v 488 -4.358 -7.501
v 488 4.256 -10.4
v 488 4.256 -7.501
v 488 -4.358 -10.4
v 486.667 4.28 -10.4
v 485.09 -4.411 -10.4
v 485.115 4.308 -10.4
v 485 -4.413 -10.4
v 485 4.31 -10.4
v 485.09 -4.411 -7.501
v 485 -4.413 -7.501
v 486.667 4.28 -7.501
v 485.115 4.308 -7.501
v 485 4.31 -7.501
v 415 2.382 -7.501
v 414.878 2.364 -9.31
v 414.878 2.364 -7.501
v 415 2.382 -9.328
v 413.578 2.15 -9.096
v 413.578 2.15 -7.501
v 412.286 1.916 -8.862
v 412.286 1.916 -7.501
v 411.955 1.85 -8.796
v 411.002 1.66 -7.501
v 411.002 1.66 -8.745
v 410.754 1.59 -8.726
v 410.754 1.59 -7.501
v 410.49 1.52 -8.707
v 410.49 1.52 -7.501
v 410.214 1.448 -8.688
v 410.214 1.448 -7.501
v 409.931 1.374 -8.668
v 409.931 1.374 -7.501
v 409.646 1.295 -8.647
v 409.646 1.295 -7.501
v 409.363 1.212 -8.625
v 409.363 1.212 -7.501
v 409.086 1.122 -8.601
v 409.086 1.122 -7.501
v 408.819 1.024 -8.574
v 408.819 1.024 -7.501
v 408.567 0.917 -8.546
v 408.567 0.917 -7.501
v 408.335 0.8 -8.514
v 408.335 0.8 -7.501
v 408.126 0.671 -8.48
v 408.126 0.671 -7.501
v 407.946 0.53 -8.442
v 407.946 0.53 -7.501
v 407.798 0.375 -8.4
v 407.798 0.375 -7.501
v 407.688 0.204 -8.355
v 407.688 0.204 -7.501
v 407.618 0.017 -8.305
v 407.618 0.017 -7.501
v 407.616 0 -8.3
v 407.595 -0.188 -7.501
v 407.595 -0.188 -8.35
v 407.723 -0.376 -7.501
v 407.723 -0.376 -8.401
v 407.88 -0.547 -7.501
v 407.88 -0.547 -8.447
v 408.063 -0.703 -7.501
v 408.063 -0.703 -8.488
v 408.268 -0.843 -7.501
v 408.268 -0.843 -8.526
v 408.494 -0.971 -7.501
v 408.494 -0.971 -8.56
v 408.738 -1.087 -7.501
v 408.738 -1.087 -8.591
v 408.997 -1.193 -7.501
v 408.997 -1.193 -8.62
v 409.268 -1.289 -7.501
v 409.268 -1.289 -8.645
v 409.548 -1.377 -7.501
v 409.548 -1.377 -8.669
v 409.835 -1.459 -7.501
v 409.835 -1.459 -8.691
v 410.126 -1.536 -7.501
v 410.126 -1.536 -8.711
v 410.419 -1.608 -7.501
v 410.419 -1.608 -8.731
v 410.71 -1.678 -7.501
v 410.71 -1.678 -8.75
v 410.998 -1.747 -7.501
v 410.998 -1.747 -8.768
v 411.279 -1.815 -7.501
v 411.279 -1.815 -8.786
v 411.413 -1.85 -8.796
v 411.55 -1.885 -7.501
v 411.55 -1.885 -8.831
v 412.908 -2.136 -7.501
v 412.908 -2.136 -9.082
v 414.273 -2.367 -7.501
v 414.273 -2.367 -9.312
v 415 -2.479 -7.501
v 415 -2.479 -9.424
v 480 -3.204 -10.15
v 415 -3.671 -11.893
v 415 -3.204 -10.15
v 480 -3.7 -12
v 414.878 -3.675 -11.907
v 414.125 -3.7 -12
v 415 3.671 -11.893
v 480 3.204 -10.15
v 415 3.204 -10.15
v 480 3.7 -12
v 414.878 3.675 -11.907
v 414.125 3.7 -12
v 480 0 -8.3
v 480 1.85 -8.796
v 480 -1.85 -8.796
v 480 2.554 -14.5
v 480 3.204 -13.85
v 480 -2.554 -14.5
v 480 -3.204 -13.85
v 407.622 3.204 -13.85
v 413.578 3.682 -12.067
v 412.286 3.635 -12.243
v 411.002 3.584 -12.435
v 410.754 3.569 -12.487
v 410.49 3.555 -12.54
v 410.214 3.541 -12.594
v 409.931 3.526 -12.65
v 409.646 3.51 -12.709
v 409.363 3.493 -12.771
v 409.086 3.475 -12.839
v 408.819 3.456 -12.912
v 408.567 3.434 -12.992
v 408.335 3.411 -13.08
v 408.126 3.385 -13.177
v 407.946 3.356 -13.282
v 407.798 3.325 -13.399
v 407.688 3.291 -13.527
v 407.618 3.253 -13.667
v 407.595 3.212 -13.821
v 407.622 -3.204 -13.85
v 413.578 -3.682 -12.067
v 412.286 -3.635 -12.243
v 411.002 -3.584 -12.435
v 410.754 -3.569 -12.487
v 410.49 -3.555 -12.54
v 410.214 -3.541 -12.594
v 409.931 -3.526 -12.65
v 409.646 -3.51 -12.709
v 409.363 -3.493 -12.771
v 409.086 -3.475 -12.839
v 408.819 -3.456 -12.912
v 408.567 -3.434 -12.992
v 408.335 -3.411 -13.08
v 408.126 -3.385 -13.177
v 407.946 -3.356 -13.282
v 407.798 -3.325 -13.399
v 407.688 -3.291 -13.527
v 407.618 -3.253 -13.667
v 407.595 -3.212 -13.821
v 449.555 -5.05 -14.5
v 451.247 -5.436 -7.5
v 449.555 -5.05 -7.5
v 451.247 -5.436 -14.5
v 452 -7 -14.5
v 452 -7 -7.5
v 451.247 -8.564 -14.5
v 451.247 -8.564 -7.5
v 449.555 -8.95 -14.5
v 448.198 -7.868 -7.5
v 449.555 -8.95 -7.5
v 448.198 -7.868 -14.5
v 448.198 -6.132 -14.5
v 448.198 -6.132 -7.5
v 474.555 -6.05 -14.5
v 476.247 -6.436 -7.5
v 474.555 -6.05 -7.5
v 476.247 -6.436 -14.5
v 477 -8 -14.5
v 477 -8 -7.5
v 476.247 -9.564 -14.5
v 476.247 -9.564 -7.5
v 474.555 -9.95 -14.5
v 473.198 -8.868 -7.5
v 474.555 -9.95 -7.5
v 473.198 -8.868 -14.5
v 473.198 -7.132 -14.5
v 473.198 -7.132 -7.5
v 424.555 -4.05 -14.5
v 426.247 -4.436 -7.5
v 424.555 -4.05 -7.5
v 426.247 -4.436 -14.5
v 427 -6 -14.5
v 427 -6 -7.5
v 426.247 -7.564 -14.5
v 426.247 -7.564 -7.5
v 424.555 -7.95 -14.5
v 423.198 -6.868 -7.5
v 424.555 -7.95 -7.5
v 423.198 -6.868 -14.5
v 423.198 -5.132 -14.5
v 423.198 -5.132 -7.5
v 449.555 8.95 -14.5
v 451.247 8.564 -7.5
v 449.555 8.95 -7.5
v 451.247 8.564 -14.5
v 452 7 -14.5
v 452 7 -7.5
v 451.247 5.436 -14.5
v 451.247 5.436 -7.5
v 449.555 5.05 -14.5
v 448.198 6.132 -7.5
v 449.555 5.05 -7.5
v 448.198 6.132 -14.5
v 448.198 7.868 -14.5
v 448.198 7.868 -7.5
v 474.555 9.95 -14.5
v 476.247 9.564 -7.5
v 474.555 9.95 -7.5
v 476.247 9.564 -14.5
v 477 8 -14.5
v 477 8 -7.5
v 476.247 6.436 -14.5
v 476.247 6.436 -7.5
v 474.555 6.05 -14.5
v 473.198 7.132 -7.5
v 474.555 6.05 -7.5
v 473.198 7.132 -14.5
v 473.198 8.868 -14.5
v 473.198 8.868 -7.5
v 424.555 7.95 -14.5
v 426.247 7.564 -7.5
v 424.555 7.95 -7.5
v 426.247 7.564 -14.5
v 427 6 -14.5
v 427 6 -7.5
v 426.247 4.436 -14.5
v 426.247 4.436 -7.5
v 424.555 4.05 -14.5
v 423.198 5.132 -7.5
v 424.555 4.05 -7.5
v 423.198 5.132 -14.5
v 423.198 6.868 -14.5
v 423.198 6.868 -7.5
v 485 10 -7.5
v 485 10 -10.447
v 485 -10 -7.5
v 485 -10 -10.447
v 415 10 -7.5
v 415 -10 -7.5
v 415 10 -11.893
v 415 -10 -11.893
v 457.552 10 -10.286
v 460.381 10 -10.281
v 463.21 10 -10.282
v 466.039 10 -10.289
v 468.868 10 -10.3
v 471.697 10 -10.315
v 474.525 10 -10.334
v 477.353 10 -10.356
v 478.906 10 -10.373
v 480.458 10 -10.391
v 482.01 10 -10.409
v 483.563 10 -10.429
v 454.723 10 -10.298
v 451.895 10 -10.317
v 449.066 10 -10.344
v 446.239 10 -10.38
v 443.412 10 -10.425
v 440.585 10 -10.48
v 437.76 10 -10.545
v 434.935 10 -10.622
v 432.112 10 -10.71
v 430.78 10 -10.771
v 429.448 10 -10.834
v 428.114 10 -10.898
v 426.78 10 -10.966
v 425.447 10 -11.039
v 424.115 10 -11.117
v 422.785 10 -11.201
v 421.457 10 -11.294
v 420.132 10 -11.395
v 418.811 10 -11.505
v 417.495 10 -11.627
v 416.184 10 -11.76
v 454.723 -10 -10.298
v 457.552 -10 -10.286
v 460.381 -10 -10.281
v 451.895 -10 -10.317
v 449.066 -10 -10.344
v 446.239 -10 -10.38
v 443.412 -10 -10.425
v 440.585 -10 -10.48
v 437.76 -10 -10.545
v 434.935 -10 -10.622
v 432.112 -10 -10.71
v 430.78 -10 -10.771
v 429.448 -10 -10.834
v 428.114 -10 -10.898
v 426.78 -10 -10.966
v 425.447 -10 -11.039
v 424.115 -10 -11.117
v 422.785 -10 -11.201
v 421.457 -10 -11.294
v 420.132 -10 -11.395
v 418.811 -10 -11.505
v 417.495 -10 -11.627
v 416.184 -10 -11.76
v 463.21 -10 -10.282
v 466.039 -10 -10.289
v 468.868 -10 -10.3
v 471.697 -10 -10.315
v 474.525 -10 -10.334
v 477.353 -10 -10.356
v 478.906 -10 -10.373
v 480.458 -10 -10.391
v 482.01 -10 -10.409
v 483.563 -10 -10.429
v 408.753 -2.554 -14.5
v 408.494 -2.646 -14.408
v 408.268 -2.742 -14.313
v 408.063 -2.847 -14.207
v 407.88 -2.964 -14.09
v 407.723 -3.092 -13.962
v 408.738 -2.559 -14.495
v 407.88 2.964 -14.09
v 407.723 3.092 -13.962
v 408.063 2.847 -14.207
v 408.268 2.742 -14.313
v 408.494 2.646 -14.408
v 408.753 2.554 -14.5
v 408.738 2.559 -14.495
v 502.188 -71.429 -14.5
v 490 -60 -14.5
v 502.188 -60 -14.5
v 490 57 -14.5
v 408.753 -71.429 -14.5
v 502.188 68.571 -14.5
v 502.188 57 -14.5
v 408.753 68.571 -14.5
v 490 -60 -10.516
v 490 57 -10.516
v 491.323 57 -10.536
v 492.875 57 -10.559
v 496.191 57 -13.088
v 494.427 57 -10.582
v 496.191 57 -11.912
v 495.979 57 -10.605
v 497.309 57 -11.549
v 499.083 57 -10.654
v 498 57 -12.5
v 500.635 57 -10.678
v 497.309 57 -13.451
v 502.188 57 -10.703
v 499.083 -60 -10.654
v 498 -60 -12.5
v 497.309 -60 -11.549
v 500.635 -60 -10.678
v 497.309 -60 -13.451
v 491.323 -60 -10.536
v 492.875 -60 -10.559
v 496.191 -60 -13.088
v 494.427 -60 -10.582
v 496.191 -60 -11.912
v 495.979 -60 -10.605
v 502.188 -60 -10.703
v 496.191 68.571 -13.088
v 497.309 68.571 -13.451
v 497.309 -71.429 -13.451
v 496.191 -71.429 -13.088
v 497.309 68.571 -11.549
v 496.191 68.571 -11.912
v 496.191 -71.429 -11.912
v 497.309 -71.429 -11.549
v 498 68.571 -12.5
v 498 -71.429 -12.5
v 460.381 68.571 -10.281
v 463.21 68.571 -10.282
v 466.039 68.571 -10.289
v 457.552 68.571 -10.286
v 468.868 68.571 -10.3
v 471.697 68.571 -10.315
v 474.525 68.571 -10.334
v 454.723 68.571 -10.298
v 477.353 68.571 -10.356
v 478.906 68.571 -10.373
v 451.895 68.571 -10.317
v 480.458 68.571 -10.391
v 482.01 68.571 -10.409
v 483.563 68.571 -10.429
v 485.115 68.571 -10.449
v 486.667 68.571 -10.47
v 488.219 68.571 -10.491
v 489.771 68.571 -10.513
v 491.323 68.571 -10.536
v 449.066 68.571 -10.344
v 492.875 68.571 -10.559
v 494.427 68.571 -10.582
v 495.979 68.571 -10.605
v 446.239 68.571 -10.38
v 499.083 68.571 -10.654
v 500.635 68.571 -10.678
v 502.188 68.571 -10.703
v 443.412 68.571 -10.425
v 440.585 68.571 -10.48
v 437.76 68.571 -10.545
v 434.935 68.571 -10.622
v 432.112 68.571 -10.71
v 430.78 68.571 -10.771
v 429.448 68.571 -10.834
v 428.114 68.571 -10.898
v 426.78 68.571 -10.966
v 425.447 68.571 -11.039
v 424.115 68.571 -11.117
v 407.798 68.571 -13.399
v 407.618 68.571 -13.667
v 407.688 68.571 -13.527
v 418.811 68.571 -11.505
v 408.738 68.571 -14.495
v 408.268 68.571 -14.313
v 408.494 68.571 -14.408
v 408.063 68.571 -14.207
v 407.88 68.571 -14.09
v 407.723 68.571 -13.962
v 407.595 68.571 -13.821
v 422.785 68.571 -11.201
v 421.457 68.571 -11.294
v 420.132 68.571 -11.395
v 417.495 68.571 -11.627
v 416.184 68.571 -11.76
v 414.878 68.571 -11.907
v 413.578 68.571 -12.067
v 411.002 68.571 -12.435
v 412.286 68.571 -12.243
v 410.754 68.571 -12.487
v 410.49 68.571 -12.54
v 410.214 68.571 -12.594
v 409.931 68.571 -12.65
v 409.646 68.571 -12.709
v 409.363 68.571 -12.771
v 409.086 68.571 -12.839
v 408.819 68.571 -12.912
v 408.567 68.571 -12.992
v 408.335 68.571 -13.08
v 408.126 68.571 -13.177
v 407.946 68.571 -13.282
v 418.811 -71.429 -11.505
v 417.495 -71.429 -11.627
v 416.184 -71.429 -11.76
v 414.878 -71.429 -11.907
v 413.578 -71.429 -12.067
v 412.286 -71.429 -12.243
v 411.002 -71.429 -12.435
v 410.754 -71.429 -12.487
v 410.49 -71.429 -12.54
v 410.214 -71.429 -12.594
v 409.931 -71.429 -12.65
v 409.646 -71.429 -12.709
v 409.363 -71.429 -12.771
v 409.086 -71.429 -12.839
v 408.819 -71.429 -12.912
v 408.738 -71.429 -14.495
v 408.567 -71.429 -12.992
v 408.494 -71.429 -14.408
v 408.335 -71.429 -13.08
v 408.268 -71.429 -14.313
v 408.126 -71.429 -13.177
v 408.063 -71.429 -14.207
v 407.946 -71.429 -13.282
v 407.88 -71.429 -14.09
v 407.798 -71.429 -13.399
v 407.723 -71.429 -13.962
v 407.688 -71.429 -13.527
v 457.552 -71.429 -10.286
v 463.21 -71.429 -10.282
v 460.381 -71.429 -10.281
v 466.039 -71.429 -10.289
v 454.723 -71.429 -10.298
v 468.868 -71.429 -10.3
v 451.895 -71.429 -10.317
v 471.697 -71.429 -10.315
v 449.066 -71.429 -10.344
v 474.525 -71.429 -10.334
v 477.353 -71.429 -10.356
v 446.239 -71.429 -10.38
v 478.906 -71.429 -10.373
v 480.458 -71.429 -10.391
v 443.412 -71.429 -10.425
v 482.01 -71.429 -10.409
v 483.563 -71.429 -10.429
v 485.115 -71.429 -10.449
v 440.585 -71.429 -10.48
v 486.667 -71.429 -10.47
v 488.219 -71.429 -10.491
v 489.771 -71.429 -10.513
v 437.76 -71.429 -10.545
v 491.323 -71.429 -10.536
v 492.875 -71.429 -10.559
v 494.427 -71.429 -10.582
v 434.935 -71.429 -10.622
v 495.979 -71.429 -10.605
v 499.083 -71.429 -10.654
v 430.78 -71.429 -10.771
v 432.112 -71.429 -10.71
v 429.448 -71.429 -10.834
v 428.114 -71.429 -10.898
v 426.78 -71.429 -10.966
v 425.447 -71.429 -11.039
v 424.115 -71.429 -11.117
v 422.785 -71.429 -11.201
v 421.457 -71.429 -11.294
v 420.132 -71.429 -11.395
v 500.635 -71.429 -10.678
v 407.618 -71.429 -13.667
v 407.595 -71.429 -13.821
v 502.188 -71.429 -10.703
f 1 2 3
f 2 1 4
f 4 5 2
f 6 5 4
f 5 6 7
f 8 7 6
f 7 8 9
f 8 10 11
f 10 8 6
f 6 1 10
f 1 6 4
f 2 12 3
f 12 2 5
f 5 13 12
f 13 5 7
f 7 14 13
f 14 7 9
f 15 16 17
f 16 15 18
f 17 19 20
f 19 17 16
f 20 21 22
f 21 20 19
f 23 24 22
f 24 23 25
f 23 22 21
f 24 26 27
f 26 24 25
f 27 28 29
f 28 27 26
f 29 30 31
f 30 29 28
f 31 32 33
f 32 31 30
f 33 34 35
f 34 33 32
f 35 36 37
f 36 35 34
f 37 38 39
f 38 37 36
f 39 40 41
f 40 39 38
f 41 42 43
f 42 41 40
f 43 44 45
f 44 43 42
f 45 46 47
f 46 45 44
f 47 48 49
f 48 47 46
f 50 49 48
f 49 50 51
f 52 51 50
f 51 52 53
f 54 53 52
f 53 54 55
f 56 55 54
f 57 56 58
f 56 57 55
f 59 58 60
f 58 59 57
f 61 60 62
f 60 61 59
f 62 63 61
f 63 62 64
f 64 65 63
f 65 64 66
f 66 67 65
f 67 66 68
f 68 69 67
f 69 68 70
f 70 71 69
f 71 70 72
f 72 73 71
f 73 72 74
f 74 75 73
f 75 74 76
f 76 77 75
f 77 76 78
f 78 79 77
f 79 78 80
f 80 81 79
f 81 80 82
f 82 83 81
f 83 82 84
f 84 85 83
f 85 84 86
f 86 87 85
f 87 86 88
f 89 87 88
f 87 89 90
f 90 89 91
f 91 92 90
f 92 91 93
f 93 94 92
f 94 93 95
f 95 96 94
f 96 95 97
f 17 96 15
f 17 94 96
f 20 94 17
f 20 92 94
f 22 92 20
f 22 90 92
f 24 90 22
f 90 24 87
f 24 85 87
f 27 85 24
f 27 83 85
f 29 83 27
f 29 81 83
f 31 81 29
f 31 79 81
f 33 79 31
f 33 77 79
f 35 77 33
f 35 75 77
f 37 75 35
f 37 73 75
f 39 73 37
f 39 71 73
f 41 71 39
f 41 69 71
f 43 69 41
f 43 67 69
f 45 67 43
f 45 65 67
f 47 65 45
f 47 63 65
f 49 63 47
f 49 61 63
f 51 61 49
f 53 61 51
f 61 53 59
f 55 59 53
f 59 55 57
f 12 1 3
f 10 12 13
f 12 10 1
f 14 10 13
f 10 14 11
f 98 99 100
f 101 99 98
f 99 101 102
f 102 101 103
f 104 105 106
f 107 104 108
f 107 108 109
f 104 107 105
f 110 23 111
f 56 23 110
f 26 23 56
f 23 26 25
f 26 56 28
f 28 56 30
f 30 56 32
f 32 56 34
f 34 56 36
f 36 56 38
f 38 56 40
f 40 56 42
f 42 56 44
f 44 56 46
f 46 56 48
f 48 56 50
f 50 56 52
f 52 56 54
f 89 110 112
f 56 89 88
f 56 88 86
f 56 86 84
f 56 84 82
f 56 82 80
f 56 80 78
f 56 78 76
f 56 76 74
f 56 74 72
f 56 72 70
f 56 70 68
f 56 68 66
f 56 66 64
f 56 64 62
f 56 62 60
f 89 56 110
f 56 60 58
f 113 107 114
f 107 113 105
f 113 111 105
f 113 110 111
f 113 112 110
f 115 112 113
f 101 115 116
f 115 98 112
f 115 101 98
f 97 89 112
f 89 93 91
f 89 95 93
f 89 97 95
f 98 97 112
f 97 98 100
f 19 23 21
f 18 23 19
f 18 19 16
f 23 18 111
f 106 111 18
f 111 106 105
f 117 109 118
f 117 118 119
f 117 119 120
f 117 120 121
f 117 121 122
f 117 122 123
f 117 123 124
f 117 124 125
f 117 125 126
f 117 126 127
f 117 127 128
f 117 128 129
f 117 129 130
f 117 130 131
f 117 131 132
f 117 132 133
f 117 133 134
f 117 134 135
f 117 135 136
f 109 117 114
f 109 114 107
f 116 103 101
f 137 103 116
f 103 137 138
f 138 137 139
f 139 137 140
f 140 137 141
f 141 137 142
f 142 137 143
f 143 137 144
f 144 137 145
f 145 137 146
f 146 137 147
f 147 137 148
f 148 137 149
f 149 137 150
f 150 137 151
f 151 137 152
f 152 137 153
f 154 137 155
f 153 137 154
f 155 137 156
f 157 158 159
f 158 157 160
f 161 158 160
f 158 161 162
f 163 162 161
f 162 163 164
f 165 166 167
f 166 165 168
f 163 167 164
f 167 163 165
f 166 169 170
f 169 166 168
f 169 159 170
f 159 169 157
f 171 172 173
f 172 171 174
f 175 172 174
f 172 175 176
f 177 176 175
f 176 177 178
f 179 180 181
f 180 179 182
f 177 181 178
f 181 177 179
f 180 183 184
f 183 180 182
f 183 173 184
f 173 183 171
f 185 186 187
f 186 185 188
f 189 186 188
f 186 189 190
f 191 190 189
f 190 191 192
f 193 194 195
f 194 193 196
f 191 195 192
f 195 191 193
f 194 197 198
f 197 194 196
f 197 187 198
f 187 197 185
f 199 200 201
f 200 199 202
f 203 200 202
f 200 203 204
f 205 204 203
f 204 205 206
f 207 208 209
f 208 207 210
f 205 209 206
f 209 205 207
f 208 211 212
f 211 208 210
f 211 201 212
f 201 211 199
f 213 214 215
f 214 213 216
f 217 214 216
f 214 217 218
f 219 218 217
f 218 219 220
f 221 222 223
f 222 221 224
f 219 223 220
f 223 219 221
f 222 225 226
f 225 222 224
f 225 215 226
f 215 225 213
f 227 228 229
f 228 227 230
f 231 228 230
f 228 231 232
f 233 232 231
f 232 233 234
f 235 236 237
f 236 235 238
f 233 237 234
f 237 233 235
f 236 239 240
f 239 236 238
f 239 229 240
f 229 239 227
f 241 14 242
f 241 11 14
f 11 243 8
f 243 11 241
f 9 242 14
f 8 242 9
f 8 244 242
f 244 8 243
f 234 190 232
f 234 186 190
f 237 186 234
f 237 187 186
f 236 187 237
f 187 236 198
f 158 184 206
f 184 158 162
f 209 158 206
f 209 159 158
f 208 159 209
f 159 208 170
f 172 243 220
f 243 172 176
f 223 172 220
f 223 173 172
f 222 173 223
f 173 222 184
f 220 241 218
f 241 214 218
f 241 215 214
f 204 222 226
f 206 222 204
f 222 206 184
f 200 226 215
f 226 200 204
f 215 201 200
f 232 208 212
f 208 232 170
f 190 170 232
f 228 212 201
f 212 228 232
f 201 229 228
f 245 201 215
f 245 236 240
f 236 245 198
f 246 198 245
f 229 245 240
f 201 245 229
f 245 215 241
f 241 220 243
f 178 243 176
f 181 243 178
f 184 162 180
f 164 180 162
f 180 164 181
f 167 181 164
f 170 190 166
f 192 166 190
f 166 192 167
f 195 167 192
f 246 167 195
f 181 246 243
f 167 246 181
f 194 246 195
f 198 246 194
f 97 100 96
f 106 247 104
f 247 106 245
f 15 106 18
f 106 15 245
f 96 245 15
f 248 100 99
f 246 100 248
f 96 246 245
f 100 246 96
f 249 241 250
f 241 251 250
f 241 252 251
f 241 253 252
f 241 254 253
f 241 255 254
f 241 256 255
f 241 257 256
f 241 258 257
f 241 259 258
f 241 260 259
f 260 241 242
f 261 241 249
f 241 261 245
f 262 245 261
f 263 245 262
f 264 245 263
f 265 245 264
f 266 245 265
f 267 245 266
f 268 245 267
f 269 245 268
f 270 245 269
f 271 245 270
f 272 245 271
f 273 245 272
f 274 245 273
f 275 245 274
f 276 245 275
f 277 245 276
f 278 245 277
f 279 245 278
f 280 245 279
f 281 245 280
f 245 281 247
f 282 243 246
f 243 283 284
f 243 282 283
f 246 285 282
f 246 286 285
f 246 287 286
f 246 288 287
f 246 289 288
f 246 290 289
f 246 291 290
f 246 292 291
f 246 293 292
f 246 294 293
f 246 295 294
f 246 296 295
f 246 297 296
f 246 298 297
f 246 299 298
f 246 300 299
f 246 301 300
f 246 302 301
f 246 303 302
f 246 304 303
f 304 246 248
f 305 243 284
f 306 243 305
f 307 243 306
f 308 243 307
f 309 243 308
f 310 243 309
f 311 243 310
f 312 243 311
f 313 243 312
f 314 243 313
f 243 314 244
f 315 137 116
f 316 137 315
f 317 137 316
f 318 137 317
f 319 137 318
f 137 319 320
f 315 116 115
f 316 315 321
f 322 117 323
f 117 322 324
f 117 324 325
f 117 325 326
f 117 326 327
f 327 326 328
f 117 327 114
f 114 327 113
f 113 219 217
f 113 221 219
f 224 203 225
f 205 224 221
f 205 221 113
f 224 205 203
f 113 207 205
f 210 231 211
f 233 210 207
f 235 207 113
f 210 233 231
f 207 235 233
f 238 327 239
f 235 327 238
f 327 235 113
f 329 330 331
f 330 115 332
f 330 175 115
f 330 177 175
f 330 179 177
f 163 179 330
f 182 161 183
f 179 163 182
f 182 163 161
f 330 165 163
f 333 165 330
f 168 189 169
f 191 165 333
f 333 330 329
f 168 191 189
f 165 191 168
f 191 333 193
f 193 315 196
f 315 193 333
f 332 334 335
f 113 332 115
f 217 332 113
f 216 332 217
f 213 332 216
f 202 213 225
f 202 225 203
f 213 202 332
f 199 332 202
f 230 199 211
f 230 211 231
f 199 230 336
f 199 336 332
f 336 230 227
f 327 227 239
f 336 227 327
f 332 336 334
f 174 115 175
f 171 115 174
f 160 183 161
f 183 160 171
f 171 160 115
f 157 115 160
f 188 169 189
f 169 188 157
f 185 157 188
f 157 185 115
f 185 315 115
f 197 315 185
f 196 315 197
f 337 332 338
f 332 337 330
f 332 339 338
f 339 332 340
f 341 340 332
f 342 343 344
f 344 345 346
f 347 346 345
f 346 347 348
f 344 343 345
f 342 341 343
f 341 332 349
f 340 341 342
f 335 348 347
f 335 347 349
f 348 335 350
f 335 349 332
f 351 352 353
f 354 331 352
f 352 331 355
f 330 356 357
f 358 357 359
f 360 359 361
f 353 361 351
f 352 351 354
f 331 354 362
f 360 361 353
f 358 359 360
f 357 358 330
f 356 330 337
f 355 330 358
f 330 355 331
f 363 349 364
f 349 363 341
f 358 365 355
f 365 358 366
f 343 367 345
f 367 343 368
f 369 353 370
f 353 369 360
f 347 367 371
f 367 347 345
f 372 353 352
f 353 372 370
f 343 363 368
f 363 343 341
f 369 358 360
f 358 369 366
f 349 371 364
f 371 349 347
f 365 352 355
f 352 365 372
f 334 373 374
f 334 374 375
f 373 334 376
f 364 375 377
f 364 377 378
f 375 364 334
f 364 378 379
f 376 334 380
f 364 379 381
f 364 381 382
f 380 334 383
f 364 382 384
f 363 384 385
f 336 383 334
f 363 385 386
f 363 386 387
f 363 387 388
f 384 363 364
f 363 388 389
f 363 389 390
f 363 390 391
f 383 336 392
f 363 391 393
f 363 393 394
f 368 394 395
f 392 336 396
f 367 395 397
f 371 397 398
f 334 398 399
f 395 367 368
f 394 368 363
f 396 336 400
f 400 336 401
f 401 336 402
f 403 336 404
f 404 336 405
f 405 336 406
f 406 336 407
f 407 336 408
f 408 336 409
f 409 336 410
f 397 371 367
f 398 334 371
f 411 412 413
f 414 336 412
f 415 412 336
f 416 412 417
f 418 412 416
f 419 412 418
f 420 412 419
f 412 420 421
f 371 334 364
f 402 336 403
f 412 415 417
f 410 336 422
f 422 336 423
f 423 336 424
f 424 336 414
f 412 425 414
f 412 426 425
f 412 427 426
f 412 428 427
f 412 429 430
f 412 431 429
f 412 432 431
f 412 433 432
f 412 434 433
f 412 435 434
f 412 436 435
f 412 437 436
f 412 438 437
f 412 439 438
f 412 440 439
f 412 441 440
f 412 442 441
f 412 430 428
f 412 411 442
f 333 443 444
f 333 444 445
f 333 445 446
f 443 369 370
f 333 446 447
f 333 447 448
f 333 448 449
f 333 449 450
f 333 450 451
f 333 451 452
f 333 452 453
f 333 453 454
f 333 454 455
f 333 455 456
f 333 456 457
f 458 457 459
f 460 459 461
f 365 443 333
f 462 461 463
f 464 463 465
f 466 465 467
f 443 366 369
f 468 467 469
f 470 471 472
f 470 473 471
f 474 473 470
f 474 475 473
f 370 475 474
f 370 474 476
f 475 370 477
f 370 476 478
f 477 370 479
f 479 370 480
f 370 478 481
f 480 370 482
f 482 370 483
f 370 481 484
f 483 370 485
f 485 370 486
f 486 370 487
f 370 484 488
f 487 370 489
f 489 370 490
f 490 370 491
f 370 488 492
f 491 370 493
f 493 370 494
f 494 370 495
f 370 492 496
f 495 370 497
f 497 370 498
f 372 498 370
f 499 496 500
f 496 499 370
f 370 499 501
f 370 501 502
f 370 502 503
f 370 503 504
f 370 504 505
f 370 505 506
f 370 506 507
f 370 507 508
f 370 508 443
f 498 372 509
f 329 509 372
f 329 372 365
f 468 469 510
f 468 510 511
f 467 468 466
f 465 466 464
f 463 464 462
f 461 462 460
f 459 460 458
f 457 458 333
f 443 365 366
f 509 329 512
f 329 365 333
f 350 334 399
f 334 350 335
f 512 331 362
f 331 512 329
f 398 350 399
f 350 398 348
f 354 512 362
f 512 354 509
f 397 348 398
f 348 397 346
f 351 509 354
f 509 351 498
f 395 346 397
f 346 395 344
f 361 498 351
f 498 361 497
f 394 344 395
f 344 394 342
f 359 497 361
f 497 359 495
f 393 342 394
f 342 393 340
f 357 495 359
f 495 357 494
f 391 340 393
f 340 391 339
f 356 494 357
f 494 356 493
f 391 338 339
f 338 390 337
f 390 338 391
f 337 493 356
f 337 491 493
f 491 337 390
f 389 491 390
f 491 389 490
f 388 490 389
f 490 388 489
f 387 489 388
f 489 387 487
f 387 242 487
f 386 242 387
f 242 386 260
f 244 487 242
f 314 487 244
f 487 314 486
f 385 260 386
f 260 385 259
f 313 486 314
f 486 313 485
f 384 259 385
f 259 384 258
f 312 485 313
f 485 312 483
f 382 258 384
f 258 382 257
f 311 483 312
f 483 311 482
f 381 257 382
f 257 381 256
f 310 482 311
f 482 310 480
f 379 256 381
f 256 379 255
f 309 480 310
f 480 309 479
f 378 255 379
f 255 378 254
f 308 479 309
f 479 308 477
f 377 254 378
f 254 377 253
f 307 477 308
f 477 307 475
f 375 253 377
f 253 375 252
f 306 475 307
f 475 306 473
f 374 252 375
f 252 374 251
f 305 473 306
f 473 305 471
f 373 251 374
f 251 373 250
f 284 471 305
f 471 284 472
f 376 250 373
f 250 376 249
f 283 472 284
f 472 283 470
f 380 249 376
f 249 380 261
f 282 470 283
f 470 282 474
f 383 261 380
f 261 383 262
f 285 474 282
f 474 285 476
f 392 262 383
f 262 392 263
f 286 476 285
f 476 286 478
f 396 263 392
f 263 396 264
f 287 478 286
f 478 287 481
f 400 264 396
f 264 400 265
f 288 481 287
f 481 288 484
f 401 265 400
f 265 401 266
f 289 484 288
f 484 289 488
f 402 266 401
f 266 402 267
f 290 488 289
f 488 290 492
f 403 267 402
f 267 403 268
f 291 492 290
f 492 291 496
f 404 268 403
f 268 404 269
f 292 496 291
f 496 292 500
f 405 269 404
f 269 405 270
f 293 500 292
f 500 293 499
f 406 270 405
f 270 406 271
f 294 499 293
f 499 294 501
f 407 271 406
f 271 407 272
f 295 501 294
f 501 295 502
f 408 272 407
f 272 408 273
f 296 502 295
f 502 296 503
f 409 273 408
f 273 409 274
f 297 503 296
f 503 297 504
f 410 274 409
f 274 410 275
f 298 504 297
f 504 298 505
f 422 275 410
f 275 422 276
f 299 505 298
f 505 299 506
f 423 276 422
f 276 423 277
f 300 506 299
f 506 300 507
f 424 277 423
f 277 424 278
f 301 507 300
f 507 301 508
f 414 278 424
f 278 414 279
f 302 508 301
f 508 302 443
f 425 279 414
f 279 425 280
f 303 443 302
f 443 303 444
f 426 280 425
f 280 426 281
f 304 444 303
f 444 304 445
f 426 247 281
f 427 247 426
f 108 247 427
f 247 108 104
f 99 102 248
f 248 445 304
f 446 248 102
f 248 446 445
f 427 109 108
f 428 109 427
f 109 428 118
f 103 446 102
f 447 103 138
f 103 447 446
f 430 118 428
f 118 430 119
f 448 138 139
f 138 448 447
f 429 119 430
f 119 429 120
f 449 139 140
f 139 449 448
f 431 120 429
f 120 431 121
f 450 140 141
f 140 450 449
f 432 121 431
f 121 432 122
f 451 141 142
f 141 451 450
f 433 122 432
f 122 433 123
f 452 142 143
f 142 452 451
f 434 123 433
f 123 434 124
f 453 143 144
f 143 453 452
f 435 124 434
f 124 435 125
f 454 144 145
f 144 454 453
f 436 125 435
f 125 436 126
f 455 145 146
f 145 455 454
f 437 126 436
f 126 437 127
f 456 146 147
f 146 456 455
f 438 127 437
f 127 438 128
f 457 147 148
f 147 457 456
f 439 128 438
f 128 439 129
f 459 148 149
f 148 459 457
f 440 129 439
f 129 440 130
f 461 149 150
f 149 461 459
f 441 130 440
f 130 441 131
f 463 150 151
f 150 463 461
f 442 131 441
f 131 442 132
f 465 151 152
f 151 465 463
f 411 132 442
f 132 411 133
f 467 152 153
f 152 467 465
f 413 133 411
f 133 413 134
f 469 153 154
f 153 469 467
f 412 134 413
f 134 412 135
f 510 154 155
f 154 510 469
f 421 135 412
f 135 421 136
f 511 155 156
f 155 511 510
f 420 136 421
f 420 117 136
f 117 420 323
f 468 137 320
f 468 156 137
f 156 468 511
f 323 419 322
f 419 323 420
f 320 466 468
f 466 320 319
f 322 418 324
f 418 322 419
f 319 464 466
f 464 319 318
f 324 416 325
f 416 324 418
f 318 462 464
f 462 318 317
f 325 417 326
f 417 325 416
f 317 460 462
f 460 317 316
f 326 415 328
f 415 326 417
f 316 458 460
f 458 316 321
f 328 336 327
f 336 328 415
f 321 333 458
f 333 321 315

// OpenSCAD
// file: tail.scad
module tail_up_front(){
  translate([0,0,2]){
    difference(){
      union(){
        scale(0.8) translate([500,-65.2,-13]){
          difference(){
            translate([0,-22,0]) scale([0.6,0.4,0.6])
              linear_extrude(file = "tail/front.dxf",height = 200, convexity = 10);
            union(){
              translate([110,60-5,-1])
              cube([36,70+5,20+15]);
              translate([110,60-5,101])
              cube([36,70+5,20]);
              translate([110,60-5,30+15])
              cube([16,70+5,60-15]);
            }
          }
        }
      }
      translate([400,-100,-7.5-300])cube(300);
    }
    translate([0,0,3])tail_upper_socket();
  }
}

module tail_front(){
difference(){
  union(){
    scale(0.8) translate([500,-65.2,-13]){
      difference(){
        translate([0,-22,0]) scale([0.6,0.4,0.6])
          linear_extrude(file = "tail/front.dxf",height = 200, convexity = 10);
        union(){
          translate([110,60-5,-1])
          cube([36,70+5,20+15]);
          translate([110,60-5,101])
          cube([36,70+5,20]);
          translate([110,60-5,30+15])
          cube([16,70+5,60-15]);
        }
      }
    }
  }
  translate([400,-100,-7.501])cube(300);
}

}

module tail_back(){
  scale(0.8) translate([500,-65.2,-13]) {
  difference(){
  scale([0.6,0.3,0.6])
  scale([0.6,1,1])
  translate([120,0,0])
  linear_extrude(file = "tail/back.dxf",height = 200, convexity = 10);
  union(){
    translate([110,60,18+15])
    cube([22,70,120-36-15]);
    translate([110,0,0]) rotate([0,45+14,0]) cube([100,297,300]);
    translate([110,0,-1-5+3]) cube([60,297,11]);
  }
  }
  }

}

module tail_rod(){
      translate([110, 0, -12])rotate([0,90,0])cylinder(r=3.7,h=370);
}

module tail_unstranlated(){
difference(){
union(){
  tail_front();
  tail_back();
}
    translate([120,65,-1])
cylinder(r=2,h=200);

}
}

module tail(){
  difference(){
    tail_unstranlated();
    tail_rod();
  }
}

module tail_socket(){
  difference(){
    translate([450,0,-10]) cube([70,20,5],center=true);
    union(){
      tail_rod();
      translate([450,-7,-100]) cylinder(r=2,h=400);
      translate([475,-8,-100]) cylinder(r=2,h=400);
      translate([425,-6,-100]) cylinder(r=2,h=400);
      translate([450,7,-100]) cylinder(r=2,h=400);
      translate([475,8,-100]) cylinder(r=2,h=400);
      translate([425,6,-100]) cylinder(r=2,h=400);
    }
  }
}

module tail_upper_socket(){
  difference(){
    translate([450,0,-10]) cube([70,20,3],center=true);
    union(){
      translate([450,-7,-100]) cylinder(r=2,h=400);
     translate([475,-8,-100]) cylinder(r=2,h=400);
     translate([425,-6,-100]) cylinder(r=2,h=400);
     translate([450,7,-100]) cylinder(r=2,h=400);
     translate([475,8,-100]) cylinder(r=2,h=400);
     translate([425,6,-100]) cylinder(r=2,h=400);
    }
  }
}

module tail_socket_bottom(){
  back_wheel();
  difference(){
    translate([450,0,-19]) cube([70,20,3],center=true);
    union(){
      tail_rod();
      translate([450,-7,-100]) cylinder(r=2,h=400);
     translate([475,-8,-100]) cylinder(r=2,h=400);
     translate([425,-6,-100]) cylinder(r=2,h=400);
     translate([450,7,-100]) cylinder(r=2,h=400);
     translate([475,8,-100]) cylinder(r=2,h=400);
     translate([425,6,-100]) cylinder(r=2,h=400);
    }
  }
}

module back_wheel(){
difference(){
 translate([470,0,-28]) cube([20,6,20],center=true);
 translate([470-10,-6+12,-28-20]) rotate([0,45,0]) cube([40,40,40],center=true);
}
}

module elevator_fixed(){
difference(){
  union(){
    translate([500*0.8,48/0.7,-66]) rotate([90,0,0])
    scale([0.48,0.24,0.7]) linear_extrude(file = "tail/front.dxf",height = 200, convexity = 10);
  }
  union(){
    tail_rod();
      translate([450,-7,-100]) cylinder(r=2,h=400);
     translate([475,-8,-100]) cylinder(r=2,h=400);
     translate([425,-6,-100]) cylinder(r=2,h=400);
     translate([450,7,-100]) cylinder(r=2,h=400);
     translate([475,8,-100]) cylinder(r=2,h=400);
     translate([425,6,-100]) cylinder(r=2,h=400);
    translate([150,-200,-17-5/2]) cube([1000,1000,5]);
    translate([490,-60,-100]) cube([50,117,300]);
    translate([497,200,-12.5]) rotate([90,0,0]) cylinder(r=1,h=400);
  }
}
}

module elevator(){
  difference(){
    difference(){
      translate([500*0.8-3+35,48/0.7,-66]) rotate([90,0,0]) scale([0.3,0.24,0.7])
      linear_extrude(file = "tail/back.dxf",height = 200, convexity = 10);
      union(){
        translate([150,-200,-17-5/2]) cube([1000,1000,5]);
        translate([490,-90,-100]) cube([16,31,300]);
        translate([490,-60+117+1-2,-100]) cube([16,297,300]);
      }
  }
    translate([497,200,-12.5]) rotate([90,0,0]) cylinder(r=1,h=400);
  }
  
}

module tail_full(){
  tail();
  tail_up_front();
  tail_rod();
  tail_socket();
  tail_socket_bottom();
  elevator_fixed();
  elevator();
}


tail_full();
// main file
use <tail.scad>;

difference(){
  difference(){
    tail_front();
    tail_rod();
  }
}

tail_socket();


elevator_fixed();
